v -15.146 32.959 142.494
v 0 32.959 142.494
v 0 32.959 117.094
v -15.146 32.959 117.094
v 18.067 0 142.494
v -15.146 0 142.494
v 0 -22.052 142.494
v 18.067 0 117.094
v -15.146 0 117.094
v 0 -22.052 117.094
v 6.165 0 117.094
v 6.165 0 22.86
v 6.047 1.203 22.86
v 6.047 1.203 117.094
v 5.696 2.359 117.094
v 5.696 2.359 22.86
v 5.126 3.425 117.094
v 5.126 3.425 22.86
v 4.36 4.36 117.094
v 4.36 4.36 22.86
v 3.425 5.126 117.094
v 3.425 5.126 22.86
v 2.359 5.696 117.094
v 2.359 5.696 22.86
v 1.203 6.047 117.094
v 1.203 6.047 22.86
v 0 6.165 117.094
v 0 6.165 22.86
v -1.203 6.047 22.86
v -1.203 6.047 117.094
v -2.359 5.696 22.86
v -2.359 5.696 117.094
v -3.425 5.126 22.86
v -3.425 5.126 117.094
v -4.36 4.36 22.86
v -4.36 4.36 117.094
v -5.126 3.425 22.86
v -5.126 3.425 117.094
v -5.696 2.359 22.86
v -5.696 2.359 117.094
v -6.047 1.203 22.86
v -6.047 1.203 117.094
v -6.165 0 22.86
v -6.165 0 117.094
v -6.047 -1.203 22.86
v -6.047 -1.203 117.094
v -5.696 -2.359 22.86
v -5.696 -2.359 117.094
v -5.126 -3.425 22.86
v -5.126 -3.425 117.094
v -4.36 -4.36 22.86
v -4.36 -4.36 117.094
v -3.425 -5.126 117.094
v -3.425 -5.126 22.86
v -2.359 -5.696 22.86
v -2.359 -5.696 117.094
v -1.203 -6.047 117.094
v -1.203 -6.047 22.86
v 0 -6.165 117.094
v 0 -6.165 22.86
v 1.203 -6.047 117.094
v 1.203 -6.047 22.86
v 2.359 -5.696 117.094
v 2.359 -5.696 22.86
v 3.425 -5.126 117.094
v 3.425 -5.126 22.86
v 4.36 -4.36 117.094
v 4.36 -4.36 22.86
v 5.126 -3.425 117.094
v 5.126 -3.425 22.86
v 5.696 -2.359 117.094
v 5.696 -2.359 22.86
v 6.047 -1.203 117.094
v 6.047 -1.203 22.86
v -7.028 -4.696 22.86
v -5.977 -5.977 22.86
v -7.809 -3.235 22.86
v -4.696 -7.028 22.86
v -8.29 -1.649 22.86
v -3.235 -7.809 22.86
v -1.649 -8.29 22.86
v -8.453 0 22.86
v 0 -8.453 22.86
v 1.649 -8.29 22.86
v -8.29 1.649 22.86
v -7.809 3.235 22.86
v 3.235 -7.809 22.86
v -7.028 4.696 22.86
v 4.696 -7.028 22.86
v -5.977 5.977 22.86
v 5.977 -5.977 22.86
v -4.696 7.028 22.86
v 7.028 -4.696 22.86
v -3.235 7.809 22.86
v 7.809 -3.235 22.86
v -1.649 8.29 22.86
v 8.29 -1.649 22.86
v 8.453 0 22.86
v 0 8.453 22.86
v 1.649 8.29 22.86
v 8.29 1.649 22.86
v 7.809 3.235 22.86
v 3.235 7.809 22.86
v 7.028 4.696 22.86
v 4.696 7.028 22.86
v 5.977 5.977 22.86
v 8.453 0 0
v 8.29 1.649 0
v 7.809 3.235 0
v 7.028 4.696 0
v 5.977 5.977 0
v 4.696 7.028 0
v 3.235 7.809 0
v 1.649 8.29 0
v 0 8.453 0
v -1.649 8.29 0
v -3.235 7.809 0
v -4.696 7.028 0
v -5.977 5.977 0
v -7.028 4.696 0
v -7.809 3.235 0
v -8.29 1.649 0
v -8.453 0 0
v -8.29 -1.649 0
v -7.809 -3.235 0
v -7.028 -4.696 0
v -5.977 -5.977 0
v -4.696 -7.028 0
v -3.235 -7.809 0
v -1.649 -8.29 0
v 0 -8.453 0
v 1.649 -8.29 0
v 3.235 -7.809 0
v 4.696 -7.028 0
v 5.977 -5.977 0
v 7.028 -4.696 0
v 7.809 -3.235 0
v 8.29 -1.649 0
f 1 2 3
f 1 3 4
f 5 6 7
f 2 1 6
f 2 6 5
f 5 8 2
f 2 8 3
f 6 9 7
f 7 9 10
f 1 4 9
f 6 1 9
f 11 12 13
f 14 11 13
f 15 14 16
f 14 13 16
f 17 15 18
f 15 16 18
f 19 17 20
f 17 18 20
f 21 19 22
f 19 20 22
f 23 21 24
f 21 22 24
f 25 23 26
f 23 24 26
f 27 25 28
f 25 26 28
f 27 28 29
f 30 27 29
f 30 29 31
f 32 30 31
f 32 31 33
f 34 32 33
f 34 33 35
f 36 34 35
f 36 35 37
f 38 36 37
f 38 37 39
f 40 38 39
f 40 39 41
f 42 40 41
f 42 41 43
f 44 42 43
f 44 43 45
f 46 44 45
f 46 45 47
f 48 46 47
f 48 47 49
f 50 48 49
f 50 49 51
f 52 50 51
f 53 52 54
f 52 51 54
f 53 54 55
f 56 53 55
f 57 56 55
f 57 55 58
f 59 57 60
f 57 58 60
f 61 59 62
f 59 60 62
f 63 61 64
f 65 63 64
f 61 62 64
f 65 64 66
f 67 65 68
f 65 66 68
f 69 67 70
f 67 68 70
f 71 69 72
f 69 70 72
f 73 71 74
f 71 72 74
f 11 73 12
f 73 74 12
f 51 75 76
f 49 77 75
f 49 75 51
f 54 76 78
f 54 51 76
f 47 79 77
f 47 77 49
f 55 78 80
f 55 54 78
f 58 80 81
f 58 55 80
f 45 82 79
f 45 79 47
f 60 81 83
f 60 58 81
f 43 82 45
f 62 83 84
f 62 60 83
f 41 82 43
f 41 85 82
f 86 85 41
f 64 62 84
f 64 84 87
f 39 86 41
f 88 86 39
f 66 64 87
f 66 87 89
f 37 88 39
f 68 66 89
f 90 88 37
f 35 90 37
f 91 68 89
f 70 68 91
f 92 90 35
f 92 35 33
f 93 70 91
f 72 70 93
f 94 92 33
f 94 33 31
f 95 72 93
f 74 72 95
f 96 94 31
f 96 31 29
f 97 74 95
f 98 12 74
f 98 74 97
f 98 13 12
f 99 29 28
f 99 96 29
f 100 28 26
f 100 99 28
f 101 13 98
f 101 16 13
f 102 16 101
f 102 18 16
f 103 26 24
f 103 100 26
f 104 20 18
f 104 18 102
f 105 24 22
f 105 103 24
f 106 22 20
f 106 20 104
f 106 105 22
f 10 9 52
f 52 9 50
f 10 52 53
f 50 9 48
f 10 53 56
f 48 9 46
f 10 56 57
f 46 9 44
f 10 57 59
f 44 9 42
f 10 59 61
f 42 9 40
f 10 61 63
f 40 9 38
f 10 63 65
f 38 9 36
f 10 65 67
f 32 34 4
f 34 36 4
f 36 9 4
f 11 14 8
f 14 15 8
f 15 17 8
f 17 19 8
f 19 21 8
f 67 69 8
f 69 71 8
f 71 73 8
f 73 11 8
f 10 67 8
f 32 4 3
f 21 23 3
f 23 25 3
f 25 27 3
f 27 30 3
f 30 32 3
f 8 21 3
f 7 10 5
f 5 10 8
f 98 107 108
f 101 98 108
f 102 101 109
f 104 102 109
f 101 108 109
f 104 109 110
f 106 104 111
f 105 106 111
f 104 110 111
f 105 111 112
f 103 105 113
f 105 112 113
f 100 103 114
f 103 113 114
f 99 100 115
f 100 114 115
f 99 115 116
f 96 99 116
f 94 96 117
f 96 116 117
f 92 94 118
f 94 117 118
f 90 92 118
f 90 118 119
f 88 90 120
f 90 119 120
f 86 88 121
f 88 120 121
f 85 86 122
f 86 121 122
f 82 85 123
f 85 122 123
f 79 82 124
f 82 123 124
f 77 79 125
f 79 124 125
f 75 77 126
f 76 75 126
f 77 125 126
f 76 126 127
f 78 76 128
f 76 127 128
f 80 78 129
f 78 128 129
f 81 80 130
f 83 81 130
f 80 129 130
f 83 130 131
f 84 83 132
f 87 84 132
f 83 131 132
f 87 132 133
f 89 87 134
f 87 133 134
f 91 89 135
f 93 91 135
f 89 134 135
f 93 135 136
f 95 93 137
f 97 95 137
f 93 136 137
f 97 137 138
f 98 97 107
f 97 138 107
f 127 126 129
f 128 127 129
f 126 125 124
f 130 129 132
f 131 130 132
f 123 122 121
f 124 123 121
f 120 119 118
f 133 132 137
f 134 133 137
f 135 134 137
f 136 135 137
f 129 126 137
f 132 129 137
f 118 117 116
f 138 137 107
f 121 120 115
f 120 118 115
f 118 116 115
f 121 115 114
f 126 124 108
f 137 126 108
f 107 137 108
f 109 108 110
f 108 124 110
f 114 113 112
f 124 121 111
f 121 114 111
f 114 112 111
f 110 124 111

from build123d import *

# Parameters (mm, degrees)
F0_R     = 6.1654664674
F1_DEPTH = 117.094
F2_R     = 8.4528335809
F3_DEPTH = 22.86
F5_DEPTH = 25.4


with BuildPart() as f1:
    # F0 (on Top) → F1 (new body)
    with BuildSketch(Plane.XY):
        Circle(F0_R)
    extrude(amount=F1_DEPTH)

    # F2 (on Top) → F3 (join)
    with BuildSketch(Plane.XY):
        Circle(F2_R)
    extrude(amount=F3_DEPTH)

    # F4 (on face) → F5 (join)
    with BuildSketch(Plane.XY.offset(117.094)):
        Polygon((-15.1460403576, 0), (0, 0), (0, 32.9593867064), align=None)
        Polygon((0, -22.0521092415), (0, 0), (-15.1460403576, 0), align=None)
        Polygon((0, 32.9593867064), (0, 0), (18.0666185915, 0), align=None)
        Polygon((18.0666185915, 0), (0, 0), (0, -22.0521092415), align=None)
        Polygon((-15.1460403576, 0), (0, 32.9593867064), (-15.1460403576, 32.9593867064), align=None)
    extrude(amount=F5_DEPTH)


solid = f1.part
